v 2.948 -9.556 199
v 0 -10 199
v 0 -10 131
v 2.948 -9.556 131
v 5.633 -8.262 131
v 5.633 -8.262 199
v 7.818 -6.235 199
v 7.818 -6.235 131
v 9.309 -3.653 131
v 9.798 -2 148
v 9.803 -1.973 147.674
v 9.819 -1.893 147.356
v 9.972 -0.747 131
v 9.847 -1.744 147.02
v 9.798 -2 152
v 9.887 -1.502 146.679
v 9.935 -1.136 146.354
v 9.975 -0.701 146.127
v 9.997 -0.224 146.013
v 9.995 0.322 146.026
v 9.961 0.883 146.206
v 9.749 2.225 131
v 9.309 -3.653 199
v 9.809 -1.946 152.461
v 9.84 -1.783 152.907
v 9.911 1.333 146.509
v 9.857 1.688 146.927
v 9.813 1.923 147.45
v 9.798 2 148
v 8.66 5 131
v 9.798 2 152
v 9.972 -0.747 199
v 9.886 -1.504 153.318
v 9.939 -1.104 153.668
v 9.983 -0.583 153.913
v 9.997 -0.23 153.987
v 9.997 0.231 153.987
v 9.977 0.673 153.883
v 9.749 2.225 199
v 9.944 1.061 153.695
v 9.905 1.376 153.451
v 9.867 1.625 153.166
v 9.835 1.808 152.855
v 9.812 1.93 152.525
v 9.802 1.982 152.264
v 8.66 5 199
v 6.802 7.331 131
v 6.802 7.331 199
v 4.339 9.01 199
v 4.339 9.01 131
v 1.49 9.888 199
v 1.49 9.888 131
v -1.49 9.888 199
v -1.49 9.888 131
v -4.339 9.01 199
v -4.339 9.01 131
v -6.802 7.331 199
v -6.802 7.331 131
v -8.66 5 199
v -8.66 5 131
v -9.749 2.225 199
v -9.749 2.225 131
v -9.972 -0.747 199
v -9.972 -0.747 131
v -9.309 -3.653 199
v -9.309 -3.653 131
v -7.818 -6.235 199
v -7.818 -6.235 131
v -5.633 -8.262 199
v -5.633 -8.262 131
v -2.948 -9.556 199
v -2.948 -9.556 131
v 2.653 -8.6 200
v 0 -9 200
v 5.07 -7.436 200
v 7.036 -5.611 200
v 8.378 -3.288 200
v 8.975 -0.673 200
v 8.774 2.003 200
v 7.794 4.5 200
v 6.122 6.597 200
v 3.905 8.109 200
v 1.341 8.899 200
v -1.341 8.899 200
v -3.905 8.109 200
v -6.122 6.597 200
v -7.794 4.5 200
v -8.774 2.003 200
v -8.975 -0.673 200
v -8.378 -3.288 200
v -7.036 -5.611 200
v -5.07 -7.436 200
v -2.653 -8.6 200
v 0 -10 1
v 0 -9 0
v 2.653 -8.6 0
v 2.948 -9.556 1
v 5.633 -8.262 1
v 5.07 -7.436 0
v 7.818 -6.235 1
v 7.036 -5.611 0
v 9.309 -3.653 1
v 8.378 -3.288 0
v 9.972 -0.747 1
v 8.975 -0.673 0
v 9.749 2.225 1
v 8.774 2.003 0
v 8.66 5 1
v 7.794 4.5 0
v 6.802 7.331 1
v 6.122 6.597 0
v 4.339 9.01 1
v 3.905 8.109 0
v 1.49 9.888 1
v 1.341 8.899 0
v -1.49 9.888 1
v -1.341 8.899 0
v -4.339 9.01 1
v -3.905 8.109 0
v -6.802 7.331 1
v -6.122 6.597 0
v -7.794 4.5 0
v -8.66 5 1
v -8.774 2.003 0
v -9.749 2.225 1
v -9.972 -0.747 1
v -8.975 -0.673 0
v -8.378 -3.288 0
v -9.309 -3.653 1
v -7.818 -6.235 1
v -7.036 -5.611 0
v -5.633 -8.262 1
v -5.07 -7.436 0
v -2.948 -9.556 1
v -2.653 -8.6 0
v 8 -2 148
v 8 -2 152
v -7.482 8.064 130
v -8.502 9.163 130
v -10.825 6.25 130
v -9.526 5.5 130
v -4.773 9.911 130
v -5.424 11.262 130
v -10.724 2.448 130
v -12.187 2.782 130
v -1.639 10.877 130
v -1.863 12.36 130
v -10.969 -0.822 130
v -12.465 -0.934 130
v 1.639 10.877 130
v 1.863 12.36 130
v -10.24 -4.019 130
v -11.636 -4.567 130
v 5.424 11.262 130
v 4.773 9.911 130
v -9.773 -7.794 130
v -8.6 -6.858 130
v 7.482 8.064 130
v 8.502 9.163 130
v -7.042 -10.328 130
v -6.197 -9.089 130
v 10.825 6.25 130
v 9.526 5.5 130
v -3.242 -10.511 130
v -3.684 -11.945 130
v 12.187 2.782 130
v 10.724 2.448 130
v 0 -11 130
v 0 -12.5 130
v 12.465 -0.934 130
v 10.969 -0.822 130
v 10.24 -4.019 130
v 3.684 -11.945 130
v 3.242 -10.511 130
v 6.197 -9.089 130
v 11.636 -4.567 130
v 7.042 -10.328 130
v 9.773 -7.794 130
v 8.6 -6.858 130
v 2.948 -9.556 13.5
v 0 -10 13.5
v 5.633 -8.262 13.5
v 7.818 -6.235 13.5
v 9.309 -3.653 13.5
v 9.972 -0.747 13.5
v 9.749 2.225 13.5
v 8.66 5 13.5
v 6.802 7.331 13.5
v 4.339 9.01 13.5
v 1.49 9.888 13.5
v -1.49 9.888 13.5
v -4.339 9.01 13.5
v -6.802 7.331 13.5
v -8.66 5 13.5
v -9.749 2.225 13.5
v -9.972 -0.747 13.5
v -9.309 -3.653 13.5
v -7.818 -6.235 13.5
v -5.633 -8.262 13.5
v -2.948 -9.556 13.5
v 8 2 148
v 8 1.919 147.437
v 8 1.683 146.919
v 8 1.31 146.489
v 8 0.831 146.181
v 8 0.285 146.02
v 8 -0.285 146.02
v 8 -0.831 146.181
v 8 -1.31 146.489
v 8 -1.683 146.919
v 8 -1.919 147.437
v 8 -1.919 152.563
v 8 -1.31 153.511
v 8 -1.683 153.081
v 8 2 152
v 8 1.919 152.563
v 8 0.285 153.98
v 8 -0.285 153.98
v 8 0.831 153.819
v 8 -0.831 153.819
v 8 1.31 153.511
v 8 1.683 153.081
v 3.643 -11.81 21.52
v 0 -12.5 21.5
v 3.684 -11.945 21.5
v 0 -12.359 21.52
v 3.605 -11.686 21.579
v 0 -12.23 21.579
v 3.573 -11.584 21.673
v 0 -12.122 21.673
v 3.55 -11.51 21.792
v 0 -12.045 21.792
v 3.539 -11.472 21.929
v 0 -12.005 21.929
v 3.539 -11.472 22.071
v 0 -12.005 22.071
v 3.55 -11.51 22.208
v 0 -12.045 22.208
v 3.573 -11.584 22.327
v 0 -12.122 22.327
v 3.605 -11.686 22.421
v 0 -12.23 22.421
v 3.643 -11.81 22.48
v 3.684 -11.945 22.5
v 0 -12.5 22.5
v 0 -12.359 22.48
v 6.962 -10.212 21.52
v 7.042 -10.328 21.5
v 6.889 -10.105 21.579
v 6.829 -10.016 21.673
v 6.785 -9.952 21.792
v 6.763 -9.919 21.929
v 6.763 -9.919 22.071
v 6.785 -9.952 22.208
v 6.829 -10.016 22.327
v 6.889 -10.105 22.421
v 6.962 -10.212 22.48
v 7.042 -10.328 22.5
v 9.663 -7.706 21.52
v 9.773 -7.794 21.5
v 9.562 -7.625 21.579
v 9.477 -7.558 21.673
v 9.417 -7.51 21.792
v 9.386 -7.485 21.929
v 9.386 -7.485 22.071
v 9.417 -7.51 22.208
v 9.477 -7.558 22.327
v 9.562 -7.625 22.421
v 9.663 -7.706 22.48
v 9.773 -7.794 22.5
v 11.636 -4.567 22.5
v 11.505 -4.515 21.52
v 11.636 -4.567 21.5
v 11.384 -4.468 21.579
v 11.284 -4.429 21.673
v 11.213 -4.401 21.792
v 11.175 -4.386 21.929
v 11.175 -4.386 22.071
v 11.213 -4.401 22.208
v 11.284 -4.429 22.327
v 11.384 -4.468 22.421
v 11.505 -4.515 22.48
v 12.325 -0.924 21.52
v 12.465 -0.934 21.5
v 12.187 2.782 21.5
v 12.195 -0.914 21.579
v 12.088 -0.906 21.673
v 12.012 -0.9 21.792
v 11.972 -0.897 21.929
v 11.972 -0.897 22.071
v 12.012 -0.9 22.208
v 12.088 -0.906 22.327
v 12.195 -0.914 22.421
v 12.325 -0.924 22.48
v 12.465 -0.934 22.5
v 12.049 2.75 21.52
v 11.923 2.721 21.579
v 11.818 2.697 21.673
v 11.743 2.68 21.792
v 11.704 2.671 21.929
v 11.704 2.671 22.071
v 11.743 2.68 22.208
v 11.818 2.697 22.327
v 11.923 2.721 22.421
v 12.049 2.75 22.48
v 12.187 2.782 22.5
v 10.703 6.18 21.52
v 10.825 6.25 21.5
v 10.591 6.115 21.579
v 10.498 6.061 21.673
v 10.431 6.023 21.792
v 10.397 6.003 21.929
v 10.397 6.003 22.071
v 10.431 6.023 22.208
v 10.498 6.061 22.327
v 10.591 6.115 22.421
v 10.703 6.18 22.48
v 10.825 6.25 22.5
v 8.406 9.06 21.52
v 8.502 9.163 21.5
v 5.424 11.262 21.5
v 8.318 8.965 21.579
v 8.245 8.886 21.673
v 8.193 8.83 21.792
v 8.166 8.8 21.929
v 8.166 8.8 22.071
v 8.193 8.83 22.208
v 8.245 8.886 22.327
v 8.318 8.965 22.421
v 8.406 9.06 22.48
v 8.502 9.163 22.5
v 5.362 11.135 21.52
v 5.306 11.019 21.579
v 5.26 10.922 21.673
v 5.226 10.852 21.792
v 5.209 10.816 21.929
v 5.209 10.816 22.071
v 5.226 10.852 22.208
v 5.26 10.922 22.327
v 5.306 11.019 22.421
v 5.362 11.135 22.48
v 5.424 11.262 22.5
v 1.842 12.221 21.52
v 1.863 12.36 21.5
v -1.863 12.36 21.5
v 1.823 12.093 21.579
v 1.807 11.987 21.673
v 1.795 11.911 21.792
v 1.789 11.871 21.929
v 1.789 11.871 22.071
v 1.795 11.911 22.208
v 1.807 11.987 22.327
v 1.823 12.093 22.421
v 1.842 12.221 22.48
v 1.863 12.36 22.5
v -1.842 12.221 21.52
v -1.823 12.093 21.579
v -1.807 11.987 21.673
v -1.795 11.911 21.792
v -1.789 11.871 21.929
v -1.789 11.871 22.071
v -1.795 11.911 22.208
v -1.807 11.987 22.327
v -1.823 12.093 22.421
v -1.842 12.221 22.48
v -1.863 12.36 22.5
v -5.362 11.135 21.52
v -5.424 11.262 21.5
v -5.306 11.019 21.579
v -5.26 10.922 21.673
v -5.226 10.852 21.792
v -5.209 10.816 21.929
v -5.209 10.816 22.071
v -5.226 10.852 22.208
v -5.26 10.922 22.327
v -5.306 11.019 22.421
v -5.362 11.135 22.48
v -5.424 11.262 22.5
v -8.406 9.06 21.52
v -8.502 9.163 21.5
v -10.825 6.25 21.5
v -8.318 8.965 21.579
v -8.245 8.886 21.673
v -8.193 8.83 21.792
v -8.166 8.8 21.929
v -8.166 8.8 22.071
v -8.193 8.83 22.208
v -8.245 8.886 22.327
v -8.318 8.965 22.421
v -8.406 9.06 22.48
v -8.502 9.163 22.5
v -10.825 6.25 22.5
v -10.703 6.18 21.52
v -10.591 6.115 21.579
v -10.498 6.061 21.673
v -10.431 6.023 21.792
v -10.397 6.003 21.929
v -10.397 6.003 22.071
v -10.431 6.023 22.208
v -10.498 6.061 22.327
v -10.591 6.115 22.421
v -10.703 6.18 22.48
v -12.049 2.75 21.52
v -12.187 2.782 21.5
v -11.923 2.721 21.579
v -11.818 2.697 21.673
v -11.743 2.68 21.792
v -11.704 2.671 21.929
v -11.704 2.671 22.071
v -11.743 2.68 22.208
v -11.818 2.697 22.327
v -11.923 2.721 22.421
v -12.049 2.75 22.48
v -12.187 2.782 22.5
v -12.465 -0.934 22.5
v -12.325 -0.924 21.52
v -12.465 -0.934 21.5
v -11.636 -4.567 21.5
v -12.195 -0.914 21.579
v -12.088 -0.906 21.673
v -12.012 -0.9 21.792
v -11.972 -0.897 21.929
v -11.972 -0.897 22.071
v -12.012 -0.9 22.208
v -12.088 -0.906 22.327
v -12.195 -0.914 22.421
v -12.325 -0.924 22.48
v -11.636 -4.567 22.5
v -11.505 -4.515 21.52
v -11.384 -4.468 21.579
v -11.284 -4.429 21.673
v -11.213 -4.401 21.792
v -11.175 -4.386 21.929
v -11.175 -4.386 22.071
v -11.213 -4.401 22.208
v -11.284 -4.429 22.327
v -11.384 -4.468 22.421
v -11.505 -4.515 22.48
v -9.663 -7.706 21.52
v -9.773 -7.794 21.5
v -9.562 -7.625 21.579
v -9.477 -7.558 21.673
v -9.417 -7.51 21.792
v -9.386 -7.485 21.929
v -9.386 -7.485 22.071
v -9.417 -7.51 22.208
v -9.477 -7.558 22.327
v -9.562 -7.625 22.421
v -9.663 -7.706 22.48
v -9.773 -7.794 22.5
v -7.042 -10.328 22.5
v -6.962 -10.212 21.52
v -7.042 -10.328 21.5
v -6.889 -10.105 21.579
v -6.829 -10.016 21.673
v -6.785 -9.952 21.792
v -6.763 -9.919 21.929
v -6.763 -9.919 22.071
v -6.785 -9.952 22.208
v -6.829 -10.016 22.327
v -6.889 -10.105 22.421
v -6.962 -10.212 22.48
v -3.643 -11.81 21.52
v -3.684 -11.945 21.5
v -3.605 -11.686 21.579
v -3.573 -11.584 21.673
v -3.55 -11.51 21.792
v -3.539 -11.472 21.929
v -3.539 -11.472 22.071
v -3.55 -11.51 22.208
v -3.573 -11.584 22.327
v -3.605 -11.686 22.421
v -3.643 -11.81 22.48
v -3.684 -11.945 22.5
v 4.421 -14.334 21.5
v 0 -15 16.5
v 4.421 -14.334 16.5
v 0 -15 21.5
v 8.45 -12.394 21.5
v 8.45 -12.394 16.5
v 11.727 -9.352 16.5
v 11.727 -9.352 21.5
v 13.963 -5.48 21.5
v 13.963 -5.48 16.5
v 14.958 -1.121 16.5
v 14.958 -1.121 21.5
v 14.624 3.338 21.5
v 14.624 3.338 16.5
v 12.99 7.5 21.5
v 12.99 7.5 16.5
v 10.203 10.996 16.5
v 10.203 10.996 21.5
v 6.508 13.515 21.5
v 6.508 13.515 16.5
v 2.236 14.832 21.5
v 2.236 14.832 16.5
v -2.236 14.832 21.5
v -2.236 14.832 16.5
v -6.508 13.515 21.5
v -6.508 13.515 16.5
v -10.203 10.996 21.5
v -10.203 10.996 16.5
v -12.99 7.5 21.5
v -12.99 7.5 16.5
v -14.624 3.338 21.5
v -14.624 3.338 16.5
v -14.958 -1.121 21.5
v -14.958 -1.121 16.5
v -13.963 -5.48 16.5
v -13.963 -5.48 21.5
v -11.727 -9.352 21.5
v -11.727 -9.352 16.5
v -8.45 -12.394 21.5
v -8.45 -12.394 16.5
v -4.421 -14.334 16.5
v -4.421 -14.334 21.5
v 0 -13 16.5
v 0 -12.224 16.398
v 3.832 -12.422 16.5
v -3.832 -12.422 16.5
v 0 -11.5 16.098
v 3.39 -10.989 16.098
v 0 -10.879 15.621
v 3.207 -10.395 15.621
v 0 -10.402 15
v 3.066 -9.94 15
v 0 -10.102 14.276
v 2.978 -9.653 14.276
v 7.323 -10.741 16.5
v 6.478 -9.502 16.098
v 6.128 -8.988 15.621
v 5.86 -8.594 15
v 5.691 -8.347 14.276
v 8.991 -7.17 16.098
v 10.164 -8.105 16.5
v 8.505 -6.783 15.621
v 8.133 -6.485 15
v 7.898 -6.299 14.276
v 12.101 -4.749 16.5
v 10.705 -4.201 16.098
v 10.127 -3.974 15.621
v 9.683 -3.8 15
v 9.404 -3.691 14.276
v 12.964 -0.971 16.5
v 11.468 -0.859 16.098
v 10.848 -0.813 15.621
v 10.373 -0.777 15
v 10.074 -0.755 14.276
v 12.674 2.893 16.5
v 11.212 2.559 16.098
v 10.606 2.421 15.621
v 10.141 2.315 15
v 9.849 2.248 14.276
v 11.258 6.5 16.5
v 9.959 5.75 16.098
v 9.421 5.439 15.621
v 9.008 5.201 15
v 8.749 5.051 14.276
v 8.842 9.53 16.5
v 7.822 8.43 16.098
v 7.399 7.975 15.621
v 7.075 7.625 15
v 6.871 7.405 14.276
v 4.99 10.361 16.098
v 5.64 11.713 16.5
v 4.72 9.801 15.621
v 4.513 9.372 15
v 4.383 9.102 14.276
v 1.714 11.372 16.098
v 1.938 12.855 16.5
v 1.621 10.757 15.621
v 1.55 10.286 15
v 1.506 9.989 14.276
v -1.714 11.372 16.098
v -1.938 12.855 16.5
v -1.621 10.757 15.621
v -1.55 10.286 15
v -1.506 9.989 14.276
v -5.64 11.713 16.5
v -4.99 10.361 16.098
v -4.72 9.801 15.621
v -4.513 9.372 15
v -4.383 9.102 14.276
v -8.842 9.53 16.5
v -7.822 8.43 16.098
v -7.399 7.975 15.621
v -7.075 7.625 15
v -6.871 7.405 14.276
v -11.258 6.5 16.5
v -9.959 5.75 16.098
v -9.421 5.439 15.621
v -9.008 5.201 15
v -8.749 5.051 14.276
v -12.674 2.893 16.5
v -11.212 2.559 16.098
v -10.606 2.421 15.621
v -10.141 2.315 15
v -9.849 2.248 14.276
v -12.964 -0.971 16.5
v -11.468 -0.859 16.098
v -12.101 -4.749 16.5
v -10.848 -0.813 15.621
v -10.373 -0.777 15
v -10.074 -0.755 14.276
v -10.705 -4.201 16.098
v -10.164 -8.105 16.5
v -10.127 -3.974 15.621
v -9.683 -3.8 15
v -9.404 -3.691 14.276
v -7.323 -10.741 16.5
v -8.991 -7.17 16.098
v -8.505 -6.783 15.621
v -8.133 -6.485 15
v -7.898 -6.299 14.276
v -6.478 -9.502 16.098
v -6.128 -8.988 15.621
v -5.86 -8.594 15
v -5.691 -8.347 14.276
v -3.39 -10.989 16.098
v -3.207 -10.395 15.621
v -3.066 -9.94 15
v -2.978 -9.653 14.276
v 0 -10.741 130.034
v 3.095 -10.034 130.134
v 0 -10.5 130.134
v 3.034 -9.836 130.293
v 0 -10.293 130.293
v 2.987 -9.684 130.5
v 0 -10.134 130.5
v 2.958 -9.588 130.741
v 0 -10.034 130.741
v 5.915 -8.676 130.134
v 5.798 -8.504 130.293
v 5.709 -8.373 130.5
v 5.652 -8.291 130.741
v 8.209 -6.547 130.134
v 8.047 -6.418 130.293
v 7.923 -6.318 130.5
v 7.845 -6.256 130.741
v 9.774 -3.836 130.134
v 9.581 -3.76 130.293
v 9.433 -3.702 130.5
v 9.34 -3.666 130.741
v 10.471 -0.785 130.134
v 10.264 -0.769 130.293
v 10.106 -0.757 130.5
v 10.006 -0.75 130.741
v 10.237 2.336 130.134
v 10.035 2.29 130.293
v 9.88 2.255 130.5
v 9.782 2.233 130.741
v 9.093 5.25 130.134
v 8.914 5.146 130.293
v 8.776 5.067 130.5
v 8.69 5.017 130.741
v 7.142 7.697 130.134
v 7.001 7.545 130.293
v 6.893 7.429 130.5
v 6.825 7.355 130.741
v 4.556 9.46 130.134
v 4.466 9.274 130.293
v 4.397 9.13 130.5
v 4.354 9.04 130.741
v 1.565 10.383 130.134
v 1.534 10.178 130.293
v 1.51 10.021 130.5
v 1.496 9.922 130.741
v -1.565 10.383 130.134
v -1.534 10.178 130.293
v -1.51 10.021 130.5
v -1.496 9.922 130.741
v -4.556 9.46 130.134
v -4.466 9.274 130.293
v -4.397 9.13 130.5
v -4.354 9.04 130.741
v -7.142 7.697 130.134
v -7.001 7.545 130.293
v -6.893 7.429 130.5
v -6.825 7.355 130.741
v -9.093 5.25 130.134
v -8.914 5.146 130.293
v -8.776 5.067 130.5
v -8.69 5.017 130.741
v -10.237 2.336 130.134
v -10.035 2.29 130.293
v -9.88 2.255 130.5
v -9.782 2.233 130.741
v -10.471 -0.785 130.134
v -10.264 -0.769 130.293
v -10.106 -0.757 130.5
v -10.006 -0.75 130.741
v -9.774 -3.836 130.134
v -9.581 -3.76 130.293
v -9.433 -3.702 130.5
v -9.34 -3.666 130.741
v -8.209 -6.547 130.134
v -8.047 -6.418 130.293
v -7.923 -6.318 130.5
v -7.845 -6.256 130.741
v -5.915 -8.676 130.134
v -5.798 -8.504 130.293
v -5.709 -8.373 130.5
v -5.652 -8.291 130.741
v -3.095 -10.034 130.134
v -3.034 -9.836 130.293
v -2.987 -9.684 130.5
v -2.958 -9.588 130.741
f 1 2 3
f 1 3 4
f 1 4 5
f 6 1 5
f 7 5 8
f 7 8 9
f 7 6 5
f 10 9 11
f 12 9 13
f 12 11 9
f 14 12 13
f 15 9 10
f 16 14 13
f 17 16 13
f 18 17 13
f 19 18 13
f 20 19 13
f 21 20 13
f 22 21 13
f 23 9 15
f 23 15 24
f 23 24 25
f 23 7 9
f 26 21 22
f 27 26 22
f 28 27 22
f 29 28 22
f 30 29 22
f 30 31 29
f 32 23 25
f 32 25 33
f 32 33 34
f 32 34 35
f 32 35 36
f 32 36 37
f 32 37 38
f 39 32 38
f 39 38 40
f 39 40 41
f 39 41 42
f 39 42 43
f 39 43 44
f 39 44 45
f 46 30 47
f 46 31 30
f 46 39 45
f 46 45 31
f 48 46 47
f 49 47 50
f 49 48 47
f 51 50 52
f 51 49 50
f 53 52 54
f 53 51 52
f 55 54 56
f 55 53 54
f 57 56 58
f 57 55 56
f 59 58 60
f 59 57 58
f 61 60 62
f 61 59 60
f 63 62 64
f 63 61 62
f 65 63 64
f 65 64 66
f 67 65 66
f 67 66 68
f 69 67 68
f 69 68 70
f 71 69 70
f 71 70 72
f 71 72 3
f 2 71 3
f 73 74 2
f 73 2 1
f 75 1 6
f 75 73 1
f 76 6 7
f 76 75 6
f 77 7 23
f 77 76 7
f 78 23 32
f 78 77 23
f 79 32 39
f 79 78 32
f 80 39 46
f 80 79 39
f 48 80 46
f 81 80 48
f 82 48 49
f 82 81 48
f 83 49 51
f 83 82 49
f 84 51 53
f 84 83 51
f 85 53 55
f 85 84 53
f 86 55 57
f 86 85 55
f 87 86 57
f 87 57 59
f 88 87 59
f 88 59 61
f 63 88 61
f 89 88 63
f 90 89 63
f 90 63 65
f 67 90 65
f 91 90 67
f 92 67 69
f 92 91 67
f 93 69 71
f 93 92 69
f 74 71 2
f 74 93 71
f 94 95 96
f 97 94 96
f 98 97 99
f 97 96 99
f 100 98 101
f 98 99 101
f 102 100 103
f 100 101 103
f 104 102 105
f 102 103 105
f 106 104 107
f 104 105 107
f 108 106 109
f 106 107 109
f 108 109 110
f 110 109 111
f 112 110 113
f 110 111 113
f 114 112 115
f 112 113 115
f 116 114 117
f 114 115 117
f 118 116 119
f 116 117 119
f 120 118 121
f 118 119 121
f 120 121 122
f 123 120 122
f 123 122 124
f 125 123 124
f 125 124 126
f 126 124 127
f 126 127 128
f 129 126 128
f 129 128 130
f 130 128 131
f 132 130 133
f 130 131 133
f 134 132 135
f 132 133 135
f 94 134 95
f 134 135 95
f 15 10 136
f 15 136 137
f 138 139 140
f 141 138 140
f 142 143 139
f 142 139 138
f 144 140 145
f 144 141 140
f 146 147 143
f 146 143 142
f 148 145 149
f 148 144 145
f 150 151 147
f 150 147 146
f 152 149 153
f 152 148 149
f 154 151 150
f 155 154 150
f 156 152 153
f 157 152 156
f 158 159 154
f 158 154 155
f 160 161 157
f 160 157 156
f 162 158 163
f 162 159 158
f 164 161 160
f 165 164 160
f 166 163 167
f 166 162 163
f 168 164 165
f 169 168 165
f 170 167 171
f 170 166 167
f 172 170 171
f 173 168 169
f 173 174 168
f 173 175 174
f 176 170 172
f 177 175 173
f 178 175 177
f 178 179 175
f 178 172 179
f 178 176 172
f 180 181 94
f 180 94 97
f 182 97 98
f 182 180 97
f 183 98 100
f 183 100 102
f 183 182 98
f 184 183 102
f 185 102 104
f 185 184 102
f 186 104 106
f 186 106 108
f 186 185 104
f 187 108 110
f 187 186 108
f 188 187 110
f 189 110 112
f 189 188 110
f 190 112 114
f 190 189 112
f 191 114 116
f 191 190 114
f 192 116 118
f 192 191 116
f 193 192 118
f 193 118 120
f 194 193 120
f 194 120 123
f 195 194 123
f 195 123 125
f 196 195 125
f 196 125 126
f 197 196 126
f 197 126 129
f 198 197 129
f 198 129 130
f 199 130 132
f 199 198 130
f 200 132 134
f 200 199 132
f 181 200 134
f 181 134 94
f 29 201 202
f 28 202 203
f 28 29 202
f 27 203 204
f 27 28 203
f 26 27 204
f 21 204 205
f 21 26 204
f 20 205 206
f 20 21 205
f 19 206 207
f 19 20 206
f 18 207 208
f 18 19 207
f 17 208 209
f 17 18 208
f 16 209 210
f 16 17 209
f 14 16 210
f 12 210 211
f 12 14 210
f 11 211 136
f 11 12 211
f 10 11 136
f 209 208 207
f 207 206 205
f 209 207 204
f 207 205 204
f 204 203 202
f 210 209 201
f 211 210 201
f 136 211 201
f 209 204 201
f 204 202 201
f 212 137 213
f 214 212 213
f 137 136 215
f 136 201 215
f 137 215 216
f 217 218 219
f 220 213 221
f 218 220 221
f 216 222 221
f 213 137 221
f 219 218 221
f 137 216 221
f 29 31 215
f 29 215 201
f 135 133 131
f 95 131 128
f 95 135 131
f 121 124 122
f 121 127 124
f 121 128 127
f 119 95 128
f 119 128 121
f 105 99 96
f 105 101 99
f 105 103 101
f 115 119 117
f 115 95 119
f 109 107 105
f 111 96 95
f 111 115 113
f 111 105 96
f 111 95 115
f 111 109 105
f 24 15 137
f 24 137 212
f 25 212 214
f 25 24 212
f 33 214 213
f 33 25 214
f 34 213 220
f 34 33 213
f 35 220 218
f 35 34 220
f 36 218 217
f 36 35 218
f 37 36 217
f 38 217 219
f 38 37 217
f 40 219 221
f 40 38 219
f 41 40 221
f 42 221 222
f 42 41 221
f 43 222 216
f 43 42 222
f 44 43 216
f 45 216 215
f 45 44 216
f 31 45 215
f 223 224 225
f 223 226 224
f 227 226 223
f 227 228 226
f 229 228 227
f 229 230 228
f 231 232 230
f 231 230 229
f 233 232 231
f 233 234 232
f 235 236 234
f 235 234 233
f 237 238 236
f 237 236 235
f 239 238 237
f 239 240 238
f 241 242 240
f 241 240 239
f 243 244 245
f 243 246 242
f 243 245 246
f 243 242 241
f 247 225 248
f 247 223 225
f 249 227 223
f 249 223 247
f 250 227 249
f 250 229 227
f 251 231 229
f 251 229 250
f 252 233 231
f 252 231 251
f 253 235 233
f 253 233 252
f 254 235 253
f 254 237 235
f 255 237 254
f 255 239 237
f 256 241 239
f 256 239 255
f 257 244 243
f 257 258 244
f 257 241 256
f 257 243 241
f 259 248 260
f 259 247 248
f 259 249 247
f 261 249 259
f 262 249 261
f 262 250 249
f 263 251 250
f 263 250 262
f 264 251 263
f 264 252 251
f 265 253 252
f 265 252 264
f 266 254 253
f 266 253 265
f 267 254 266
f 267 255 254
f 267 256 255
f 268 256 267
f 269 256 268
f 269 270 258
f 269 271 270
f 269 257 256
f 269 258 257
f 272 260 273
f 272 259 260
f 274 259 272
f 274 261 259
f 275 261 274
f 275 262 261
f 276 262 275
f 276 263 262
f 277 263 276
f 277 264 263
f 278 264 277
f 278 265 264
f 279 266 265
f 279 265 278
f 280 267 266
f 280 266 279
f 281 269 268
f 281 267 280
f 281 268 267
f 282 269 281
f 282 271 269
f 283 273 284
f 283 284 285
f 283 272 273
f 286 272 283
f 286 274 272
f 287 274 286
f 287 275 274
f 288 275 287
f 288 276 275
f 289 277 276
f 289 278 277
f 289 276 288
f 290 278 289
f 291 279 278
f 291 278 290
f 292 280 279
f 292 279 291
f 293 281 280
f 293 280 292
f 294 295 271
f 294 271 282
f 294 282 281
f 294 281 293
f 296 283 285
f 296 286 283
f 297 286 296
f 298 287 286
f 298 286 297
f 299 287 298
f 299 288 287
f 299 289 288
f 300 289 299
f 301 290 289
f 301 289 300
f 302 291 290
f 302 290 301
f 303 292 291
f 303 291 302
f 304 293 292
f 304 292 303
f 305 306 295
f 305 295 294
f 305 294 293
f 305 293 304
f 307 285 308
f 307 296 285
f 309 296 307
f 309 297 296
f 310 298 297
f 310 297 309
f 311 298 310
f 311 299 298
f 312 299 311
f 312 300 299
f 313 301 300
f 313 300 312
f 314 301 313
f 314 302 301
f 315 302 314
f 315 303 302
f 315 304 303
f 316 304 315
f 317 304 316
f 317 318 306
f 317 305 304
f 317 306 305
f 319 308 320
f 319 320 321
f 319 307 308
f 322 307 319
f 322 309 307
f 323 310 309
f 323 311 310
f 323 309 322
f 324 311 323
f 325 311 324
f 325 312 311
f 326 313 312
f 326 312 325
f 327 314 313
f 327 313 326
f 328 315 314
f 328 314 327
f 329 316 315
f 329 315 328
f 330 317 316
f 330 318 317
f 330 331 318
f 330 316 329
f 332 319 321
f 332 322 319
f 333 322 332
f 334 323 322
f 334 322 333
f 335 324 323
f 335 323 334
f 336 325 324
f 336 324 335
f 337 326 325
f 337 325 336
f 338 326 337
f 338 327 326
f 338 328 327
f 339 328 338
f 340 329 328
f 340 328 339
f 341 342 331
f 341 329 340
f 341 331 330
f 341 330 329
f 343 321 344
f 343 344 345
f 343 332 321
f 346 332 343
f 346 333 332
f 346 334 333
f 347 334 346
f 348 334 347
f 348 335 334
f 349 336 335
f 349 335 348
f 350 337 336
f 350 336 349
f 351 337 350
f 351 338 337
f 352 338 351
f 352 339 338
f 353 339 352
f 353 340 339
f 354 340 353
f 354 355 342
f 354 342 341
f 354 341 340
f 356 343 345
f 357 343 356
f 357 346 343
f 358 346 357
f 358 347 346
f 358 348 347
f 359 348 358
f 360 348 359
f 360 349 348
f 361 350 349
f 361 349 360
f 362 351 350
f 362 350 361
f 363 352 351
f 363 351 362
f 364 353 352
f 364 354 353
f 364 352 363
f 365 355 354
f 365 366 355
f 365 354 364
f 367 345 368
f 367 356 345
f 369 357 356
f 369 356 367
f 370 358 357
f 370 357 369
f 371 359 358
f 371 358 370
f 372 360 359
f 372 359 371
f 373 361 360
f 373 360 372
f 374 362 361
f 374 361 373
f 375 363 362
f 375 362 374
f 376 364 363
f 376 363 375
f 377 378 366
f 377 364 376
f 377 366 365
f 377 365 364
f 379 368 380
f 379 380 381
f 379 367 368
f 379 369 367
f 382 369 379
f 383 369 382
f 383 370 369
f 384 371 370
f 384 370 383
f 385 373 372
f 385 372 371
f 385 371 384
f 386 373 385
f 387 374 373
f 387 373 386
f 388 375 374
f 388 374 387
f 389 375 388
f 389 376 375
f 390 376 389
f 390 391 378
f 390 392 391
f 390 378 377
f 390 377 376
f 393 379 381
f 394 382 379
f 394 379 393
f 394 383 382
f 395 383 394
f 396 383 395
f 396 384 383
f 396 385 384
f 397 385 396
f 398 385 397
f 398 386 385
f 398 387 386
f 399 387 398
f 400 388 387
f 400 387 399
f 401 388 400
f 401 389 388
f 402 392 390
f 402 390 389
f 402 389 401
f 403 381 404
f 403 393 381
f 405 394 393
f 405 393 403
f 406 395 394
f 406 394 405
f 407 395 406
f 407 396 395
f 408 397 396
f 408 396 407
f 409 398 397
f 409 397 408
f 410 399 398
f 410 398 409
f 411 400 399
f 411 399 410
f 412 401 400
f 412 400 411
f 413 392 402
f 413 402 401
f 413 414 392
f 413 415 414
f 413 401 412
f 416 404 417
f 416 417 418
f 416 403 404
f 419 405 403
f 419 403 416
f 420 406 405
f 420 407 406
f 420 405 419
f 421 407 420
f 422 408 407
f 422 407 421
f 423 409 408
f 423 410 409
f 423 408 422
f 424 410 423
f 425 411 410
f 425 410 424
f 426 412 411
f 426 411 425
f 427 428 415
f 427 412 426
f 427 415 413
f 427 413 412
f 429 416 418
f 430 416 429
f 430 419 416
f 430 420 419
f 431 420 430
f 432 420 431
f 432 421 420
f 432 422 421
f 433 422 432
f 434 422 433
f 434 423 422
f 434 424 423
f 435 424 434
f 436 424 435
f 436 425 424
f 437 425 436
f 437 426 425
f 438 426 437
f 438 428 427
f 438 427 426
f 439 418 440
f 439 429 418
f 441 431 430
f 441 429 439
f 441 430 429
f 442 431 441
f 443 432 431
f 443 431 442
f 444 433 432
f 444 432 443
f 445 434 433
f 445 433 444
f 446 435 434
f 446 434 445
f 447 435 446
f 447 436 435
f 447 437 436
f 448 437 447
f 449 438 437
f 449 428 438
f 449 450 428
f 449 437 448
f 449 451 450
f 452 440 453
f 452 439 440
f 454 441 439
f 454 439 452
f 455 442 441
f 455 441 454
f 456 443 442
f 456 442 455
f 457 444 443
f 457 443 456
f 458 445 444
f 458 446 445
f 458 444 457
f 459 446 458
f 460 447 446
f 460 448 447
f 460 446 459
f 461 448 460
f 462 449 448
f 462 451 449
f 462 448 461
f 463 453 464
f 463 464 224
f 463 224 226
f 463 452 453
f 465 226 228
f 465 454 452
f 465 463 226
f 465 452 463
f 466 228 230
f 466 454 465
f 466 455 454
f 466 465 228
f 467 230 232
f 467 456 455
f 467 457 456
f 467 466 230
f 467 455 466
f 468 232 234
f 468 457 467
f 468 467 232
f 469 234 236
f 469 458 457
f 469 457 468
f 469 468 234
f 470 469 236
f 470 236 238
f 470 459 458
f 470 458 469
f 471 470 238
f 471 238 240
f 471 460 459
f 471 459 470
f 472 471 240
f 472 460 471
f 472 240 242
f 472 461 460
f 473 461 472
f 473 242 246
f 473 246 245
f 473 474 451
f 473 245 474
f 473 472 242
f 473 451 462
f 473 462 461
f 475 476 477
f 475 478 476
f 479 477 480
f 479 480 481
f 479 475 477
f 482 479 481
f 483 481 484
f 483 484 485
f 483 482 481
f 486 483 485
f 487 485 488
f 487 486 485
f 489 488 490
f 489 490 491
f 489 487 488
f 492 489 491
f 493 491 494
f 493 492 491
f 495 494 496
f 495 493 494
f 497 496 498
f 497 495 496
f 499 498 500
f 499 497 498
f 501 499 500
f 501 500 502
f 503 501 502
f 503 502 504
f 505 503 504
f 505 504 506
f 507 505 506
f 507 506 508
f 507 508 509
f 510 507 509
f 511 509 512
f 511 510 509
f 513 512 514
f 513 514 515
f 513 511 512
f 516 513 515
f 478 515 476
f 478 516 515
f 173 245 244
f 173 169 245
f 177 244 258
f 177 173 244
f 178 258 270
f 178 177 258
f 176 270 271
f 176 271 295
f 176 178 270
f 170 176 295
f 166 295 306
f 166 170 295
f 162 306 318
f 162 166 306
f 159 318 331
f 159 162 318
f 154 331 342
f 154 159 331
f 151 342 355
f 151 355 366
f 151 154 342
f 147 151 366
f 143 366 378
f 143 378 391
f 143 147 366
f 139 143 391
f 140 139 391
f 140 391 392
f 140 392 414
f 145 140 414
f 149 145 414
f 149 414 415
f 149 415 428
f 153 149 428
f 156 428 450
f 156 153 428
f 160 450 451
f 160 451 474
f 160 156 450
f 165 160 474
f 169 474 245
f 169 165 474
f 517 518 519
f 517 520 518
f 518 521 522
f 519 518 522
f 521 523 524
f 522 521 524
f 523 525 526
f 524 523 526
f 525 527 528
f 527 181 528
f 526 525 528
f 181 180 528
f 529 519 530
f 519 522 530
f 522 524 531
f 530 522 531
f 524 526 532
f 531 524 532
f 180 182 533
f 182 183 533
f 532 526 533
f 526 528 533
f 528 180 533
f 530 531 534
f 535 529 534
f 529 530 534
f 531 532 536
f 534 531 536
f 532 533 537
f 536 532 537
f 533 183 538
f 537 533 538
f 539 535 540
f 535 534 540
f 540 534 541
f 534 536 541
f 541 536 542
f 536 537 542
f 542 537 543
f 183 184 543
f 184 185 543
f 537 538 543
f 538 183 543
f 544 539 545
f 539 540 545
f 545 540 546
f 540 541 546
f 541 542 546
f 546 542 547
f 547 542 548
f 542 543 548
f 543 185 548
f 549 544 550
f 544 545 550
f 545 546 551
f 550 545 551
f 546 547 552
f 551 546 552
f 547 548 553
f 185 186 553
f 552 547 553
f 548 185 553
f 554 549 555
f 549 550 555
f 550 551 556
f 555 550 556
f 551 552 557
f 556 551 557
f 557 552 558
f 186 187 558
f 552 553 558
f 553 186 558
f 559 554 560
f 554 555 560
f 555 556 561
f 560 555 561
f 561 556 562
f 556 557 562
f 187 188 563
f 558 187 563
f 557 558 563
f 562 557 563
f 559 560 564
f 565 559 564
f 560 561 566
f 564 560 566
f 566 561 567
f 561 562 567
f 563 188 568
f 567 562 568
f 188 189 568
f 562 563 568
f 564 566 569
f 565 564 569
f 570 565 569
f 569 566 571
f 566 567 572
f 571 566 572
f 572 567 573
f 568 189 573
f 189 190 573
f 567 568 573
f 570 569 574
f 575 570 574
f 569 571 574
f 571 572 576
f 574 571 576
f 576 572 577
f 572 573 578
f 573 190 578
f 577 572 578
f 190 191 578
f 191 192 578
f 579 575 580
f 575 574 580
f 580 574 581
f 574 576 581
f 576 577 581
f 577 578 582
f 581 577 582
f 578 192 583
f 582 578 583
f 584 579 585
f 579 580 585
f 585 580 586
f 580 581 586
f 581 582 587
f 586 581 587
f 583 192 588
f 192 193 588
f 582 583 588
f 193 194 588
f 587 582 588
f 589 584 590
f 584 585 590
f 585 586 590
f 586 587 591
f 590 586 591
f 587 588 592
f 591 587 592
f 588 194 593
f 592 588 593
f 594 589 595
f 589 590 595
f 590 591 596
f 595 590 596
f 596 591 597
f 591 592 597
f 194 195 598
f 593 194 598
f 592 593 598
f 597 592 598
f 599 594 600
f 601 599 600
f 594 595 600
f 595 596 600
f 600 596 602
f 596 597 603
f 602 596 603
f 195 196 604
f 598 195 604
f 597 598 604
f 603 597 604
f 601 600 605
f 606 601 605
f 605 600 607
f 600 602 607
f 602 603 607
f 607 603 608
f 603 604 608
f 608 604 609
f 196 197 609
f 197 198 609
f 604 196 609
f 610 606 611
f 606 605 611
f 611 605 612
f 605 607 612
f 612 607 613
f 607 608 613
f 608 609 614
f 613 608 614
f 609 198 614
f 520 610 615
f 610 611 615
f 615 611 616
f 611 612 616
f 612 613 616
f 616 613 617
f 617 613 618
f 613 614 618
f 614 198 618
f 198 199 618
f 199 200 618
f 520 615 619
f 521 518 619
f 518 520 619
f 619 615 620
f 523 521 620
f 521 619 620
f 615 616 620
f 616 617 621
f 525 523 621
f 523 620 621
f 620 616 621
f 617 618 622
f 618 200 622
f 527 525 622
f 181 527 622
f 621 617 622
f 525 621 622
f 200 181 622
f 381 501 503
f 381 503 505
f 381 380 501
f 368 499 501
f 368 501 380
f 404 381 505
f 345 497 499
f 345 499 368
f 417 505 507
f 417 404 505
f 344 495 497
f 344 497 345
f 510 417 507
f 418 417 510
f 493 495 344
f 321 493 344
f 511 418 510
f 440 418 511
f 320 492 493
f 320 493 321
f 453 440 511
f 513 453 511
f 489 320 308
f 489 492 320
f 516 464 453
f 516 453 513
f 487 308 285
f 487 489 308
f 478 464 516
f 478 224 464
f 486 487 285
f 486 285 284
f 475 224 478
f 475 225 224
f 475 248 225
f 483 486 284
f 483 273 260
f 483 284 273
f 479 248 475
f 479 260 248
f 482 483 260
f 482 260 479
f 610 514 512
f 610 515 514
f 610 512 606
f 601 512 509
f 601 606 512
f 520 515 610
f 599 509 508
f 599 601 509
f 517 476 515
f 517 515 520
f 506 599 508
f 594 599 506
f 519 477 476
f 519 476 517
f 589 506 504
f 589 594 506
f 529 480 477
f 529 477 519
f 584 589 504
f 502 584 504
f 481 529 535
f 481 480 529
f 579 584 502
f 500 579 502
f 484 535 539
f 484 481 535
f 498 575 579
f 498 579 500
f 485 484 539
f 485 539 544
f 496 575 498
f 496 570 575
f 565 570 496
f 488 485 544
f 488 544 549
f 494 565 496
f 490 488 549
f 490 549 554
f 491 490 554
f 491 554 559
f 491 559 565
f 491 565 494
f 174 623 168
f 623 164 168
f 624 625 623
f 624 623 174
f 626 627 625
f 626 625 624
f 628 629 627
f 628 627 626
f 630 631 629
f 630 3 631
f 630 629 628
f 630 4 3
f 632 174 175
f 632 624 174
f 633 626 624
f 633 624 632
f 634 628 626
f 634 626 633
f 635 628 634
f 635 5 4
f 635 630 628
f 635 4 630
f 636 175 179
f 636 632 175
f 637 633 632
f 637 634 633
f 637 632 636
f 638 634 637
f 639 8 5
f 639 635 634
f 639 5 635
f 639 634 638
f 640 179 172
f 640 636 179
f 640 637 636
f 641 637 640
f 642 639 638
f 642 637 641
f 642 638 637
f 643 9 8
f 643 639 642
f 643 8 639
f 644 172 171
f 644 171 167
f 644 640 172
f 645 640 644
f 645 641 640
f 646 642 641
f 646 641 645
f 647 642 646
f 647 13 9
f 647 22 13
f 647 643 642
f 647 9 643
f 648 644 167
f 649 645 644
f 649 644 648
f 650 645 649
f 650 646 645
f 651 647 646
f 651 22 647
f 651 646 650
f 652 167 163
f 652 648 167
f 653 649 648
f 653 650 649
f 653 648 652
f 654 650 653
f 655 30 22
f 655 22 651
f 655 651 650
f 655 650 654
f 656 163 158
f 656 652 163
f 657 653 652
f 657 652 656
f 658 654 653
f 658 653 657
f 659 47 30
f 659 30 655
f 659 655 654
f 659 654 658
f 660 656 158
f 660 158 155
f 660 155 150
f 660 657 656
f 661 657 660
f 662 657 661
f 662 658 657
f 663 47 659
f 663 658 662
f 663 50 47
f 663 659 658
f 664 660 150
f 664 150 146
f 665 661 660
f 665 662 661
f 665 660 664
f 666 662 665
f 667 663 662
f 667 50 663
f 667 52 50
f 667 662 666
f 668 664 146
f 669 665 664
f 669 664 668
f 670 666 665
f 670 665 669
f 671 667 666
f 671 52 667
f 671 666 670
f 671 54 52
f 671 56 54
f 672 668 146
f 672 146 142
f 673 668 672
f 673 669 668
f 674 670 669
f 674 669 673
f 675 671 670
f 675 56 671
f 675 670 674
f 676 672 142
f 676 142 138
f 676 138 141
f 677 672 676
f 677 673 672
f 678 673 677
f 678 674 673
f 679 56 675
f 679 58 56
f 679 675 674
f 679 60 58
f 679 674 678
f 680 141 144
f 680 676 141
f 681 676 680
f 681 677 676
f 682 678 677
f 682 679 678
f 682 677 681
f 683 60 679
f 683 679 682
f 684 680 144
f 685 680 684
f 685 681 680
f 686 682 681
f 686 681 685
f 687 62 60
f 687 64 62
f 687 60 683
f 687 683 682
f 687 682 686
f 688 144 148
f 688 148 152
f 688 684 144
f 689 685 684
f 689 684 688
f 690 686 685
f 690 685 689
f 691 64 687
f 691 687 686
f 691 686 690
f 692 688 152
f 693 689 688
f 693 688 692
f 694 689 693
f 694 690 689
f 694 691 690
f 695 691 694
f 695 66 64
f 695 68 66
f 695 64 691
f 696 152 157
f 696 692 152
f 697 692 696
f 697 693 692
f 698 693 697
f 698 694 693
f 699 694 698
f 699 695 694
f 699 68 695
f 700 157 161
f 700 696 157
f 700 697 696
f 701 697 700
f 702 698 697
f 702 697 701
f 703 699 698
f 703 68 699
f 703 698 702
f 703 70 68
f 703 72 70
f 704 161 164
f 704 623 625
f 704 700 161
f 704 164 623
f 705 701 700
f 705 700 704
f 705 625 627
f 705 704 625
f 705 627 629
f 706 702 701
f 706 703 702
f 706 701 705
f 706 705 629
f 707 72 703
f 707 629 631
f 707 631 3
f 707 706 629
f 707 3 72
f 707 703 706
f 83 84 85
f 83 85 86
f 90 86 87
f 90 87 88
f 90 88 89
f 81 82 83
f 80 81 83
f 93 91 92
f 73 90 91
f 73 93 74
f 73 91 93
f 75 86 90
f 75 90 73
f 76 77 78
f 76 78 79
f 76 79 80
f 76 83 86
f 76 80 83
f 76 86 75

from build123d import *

# Parameters (mm, degrees)
FILLET1_R          = 1
FILLET2_R          = 3
CHAMFER1_SIZE      = 1
CUT_EXTRUDE2_START = 10
CUT_EXTRUDE2_DEPTH = 2
CHAMFER2_SIZE      = 1


with BuildPart() as part:
    # Sketch1 → Revolve1 (revolve)
    with BuildSketch(Plane(origin=(0, 0, 0), x_dir=(0, 0, -1), z_dir=(1, 0, 0))):
        with BuildLine():
            Line((0, 0), (0, -10))
            Line((0, -10), (-16.5, -10))
            Line((-16.5, -10), (-16.5, -15))
            Line((-16.5, -15), (-21.5, -15))
            Line((-21.5, -15), (-21.5, -12.5))
            ThreePointArc((-21.5, -12.5), (-22, -12), (-22.5, -12.5))
            Line((-22.5, -12.5), (-130, -12.5))
            Line((-130, -12.5), (-130, -10))
            Line((-130, -10), (-200, -10))
            Line((-200, -10), (-200, 0))
            Line((-200, 0), (0, 0))
        make_face()
    revolve(axis=Axis((0, 0, 0), (0, 0, 1)))

    # Fillet1
    fillet1_edges = [part.edges().sort_by_distance(p)[0] for p in [
        (0, 10, 130),
    ]]
    fillet(fillet1_edges, radius=FILLET1_R)

    # Fillet2
    fillet2_edges = [part.edges().sort_by_distance(p)[0] for p in [
        (0, 10, 16.5),
    ]]
    fillet(fillet2_edges, radius=FILLET2_R)

    # Chamfer1
    chamfer1_edges = [part.edges().sort_by_distance(p)[0] for p in [
        (0, 10, 200),
    ]]
    chamfer(chamfer1_edges, length=CHAMFER1_SIZE)

    # Sketch2 → Cut-Extrude2 (cut)
    with BuildSketch(Plane(origin=(0, 0, 0), x_dir=(0, 0, -1), z_dir=(1, 0, 0)).offset(CUT_EXTRUDE2_START)):
        with BuildLine():
            Line((-148, -2), (-152, -2))
            ThreePointArc((-152, -2), (-154, 0), (-152, 2))
            Line((-152, 2), (-148, 2))
            ThreePointArc((-148, 2), (-146, 0), (-148, -2))
        make_face()
    extrude(amount=-CUT_EXTRUDE2_DEPTH, mode=Mode.SUBTRACT)

    # Chamfer2
    chamfer2_edges = [part.edges().sort_by_distance(p)[0] for p in [
        (0, 10, 0),
    ]]
    chamfer(chamfer2_edges, length=CHAMFER2_SIZE)


solid = part.part
